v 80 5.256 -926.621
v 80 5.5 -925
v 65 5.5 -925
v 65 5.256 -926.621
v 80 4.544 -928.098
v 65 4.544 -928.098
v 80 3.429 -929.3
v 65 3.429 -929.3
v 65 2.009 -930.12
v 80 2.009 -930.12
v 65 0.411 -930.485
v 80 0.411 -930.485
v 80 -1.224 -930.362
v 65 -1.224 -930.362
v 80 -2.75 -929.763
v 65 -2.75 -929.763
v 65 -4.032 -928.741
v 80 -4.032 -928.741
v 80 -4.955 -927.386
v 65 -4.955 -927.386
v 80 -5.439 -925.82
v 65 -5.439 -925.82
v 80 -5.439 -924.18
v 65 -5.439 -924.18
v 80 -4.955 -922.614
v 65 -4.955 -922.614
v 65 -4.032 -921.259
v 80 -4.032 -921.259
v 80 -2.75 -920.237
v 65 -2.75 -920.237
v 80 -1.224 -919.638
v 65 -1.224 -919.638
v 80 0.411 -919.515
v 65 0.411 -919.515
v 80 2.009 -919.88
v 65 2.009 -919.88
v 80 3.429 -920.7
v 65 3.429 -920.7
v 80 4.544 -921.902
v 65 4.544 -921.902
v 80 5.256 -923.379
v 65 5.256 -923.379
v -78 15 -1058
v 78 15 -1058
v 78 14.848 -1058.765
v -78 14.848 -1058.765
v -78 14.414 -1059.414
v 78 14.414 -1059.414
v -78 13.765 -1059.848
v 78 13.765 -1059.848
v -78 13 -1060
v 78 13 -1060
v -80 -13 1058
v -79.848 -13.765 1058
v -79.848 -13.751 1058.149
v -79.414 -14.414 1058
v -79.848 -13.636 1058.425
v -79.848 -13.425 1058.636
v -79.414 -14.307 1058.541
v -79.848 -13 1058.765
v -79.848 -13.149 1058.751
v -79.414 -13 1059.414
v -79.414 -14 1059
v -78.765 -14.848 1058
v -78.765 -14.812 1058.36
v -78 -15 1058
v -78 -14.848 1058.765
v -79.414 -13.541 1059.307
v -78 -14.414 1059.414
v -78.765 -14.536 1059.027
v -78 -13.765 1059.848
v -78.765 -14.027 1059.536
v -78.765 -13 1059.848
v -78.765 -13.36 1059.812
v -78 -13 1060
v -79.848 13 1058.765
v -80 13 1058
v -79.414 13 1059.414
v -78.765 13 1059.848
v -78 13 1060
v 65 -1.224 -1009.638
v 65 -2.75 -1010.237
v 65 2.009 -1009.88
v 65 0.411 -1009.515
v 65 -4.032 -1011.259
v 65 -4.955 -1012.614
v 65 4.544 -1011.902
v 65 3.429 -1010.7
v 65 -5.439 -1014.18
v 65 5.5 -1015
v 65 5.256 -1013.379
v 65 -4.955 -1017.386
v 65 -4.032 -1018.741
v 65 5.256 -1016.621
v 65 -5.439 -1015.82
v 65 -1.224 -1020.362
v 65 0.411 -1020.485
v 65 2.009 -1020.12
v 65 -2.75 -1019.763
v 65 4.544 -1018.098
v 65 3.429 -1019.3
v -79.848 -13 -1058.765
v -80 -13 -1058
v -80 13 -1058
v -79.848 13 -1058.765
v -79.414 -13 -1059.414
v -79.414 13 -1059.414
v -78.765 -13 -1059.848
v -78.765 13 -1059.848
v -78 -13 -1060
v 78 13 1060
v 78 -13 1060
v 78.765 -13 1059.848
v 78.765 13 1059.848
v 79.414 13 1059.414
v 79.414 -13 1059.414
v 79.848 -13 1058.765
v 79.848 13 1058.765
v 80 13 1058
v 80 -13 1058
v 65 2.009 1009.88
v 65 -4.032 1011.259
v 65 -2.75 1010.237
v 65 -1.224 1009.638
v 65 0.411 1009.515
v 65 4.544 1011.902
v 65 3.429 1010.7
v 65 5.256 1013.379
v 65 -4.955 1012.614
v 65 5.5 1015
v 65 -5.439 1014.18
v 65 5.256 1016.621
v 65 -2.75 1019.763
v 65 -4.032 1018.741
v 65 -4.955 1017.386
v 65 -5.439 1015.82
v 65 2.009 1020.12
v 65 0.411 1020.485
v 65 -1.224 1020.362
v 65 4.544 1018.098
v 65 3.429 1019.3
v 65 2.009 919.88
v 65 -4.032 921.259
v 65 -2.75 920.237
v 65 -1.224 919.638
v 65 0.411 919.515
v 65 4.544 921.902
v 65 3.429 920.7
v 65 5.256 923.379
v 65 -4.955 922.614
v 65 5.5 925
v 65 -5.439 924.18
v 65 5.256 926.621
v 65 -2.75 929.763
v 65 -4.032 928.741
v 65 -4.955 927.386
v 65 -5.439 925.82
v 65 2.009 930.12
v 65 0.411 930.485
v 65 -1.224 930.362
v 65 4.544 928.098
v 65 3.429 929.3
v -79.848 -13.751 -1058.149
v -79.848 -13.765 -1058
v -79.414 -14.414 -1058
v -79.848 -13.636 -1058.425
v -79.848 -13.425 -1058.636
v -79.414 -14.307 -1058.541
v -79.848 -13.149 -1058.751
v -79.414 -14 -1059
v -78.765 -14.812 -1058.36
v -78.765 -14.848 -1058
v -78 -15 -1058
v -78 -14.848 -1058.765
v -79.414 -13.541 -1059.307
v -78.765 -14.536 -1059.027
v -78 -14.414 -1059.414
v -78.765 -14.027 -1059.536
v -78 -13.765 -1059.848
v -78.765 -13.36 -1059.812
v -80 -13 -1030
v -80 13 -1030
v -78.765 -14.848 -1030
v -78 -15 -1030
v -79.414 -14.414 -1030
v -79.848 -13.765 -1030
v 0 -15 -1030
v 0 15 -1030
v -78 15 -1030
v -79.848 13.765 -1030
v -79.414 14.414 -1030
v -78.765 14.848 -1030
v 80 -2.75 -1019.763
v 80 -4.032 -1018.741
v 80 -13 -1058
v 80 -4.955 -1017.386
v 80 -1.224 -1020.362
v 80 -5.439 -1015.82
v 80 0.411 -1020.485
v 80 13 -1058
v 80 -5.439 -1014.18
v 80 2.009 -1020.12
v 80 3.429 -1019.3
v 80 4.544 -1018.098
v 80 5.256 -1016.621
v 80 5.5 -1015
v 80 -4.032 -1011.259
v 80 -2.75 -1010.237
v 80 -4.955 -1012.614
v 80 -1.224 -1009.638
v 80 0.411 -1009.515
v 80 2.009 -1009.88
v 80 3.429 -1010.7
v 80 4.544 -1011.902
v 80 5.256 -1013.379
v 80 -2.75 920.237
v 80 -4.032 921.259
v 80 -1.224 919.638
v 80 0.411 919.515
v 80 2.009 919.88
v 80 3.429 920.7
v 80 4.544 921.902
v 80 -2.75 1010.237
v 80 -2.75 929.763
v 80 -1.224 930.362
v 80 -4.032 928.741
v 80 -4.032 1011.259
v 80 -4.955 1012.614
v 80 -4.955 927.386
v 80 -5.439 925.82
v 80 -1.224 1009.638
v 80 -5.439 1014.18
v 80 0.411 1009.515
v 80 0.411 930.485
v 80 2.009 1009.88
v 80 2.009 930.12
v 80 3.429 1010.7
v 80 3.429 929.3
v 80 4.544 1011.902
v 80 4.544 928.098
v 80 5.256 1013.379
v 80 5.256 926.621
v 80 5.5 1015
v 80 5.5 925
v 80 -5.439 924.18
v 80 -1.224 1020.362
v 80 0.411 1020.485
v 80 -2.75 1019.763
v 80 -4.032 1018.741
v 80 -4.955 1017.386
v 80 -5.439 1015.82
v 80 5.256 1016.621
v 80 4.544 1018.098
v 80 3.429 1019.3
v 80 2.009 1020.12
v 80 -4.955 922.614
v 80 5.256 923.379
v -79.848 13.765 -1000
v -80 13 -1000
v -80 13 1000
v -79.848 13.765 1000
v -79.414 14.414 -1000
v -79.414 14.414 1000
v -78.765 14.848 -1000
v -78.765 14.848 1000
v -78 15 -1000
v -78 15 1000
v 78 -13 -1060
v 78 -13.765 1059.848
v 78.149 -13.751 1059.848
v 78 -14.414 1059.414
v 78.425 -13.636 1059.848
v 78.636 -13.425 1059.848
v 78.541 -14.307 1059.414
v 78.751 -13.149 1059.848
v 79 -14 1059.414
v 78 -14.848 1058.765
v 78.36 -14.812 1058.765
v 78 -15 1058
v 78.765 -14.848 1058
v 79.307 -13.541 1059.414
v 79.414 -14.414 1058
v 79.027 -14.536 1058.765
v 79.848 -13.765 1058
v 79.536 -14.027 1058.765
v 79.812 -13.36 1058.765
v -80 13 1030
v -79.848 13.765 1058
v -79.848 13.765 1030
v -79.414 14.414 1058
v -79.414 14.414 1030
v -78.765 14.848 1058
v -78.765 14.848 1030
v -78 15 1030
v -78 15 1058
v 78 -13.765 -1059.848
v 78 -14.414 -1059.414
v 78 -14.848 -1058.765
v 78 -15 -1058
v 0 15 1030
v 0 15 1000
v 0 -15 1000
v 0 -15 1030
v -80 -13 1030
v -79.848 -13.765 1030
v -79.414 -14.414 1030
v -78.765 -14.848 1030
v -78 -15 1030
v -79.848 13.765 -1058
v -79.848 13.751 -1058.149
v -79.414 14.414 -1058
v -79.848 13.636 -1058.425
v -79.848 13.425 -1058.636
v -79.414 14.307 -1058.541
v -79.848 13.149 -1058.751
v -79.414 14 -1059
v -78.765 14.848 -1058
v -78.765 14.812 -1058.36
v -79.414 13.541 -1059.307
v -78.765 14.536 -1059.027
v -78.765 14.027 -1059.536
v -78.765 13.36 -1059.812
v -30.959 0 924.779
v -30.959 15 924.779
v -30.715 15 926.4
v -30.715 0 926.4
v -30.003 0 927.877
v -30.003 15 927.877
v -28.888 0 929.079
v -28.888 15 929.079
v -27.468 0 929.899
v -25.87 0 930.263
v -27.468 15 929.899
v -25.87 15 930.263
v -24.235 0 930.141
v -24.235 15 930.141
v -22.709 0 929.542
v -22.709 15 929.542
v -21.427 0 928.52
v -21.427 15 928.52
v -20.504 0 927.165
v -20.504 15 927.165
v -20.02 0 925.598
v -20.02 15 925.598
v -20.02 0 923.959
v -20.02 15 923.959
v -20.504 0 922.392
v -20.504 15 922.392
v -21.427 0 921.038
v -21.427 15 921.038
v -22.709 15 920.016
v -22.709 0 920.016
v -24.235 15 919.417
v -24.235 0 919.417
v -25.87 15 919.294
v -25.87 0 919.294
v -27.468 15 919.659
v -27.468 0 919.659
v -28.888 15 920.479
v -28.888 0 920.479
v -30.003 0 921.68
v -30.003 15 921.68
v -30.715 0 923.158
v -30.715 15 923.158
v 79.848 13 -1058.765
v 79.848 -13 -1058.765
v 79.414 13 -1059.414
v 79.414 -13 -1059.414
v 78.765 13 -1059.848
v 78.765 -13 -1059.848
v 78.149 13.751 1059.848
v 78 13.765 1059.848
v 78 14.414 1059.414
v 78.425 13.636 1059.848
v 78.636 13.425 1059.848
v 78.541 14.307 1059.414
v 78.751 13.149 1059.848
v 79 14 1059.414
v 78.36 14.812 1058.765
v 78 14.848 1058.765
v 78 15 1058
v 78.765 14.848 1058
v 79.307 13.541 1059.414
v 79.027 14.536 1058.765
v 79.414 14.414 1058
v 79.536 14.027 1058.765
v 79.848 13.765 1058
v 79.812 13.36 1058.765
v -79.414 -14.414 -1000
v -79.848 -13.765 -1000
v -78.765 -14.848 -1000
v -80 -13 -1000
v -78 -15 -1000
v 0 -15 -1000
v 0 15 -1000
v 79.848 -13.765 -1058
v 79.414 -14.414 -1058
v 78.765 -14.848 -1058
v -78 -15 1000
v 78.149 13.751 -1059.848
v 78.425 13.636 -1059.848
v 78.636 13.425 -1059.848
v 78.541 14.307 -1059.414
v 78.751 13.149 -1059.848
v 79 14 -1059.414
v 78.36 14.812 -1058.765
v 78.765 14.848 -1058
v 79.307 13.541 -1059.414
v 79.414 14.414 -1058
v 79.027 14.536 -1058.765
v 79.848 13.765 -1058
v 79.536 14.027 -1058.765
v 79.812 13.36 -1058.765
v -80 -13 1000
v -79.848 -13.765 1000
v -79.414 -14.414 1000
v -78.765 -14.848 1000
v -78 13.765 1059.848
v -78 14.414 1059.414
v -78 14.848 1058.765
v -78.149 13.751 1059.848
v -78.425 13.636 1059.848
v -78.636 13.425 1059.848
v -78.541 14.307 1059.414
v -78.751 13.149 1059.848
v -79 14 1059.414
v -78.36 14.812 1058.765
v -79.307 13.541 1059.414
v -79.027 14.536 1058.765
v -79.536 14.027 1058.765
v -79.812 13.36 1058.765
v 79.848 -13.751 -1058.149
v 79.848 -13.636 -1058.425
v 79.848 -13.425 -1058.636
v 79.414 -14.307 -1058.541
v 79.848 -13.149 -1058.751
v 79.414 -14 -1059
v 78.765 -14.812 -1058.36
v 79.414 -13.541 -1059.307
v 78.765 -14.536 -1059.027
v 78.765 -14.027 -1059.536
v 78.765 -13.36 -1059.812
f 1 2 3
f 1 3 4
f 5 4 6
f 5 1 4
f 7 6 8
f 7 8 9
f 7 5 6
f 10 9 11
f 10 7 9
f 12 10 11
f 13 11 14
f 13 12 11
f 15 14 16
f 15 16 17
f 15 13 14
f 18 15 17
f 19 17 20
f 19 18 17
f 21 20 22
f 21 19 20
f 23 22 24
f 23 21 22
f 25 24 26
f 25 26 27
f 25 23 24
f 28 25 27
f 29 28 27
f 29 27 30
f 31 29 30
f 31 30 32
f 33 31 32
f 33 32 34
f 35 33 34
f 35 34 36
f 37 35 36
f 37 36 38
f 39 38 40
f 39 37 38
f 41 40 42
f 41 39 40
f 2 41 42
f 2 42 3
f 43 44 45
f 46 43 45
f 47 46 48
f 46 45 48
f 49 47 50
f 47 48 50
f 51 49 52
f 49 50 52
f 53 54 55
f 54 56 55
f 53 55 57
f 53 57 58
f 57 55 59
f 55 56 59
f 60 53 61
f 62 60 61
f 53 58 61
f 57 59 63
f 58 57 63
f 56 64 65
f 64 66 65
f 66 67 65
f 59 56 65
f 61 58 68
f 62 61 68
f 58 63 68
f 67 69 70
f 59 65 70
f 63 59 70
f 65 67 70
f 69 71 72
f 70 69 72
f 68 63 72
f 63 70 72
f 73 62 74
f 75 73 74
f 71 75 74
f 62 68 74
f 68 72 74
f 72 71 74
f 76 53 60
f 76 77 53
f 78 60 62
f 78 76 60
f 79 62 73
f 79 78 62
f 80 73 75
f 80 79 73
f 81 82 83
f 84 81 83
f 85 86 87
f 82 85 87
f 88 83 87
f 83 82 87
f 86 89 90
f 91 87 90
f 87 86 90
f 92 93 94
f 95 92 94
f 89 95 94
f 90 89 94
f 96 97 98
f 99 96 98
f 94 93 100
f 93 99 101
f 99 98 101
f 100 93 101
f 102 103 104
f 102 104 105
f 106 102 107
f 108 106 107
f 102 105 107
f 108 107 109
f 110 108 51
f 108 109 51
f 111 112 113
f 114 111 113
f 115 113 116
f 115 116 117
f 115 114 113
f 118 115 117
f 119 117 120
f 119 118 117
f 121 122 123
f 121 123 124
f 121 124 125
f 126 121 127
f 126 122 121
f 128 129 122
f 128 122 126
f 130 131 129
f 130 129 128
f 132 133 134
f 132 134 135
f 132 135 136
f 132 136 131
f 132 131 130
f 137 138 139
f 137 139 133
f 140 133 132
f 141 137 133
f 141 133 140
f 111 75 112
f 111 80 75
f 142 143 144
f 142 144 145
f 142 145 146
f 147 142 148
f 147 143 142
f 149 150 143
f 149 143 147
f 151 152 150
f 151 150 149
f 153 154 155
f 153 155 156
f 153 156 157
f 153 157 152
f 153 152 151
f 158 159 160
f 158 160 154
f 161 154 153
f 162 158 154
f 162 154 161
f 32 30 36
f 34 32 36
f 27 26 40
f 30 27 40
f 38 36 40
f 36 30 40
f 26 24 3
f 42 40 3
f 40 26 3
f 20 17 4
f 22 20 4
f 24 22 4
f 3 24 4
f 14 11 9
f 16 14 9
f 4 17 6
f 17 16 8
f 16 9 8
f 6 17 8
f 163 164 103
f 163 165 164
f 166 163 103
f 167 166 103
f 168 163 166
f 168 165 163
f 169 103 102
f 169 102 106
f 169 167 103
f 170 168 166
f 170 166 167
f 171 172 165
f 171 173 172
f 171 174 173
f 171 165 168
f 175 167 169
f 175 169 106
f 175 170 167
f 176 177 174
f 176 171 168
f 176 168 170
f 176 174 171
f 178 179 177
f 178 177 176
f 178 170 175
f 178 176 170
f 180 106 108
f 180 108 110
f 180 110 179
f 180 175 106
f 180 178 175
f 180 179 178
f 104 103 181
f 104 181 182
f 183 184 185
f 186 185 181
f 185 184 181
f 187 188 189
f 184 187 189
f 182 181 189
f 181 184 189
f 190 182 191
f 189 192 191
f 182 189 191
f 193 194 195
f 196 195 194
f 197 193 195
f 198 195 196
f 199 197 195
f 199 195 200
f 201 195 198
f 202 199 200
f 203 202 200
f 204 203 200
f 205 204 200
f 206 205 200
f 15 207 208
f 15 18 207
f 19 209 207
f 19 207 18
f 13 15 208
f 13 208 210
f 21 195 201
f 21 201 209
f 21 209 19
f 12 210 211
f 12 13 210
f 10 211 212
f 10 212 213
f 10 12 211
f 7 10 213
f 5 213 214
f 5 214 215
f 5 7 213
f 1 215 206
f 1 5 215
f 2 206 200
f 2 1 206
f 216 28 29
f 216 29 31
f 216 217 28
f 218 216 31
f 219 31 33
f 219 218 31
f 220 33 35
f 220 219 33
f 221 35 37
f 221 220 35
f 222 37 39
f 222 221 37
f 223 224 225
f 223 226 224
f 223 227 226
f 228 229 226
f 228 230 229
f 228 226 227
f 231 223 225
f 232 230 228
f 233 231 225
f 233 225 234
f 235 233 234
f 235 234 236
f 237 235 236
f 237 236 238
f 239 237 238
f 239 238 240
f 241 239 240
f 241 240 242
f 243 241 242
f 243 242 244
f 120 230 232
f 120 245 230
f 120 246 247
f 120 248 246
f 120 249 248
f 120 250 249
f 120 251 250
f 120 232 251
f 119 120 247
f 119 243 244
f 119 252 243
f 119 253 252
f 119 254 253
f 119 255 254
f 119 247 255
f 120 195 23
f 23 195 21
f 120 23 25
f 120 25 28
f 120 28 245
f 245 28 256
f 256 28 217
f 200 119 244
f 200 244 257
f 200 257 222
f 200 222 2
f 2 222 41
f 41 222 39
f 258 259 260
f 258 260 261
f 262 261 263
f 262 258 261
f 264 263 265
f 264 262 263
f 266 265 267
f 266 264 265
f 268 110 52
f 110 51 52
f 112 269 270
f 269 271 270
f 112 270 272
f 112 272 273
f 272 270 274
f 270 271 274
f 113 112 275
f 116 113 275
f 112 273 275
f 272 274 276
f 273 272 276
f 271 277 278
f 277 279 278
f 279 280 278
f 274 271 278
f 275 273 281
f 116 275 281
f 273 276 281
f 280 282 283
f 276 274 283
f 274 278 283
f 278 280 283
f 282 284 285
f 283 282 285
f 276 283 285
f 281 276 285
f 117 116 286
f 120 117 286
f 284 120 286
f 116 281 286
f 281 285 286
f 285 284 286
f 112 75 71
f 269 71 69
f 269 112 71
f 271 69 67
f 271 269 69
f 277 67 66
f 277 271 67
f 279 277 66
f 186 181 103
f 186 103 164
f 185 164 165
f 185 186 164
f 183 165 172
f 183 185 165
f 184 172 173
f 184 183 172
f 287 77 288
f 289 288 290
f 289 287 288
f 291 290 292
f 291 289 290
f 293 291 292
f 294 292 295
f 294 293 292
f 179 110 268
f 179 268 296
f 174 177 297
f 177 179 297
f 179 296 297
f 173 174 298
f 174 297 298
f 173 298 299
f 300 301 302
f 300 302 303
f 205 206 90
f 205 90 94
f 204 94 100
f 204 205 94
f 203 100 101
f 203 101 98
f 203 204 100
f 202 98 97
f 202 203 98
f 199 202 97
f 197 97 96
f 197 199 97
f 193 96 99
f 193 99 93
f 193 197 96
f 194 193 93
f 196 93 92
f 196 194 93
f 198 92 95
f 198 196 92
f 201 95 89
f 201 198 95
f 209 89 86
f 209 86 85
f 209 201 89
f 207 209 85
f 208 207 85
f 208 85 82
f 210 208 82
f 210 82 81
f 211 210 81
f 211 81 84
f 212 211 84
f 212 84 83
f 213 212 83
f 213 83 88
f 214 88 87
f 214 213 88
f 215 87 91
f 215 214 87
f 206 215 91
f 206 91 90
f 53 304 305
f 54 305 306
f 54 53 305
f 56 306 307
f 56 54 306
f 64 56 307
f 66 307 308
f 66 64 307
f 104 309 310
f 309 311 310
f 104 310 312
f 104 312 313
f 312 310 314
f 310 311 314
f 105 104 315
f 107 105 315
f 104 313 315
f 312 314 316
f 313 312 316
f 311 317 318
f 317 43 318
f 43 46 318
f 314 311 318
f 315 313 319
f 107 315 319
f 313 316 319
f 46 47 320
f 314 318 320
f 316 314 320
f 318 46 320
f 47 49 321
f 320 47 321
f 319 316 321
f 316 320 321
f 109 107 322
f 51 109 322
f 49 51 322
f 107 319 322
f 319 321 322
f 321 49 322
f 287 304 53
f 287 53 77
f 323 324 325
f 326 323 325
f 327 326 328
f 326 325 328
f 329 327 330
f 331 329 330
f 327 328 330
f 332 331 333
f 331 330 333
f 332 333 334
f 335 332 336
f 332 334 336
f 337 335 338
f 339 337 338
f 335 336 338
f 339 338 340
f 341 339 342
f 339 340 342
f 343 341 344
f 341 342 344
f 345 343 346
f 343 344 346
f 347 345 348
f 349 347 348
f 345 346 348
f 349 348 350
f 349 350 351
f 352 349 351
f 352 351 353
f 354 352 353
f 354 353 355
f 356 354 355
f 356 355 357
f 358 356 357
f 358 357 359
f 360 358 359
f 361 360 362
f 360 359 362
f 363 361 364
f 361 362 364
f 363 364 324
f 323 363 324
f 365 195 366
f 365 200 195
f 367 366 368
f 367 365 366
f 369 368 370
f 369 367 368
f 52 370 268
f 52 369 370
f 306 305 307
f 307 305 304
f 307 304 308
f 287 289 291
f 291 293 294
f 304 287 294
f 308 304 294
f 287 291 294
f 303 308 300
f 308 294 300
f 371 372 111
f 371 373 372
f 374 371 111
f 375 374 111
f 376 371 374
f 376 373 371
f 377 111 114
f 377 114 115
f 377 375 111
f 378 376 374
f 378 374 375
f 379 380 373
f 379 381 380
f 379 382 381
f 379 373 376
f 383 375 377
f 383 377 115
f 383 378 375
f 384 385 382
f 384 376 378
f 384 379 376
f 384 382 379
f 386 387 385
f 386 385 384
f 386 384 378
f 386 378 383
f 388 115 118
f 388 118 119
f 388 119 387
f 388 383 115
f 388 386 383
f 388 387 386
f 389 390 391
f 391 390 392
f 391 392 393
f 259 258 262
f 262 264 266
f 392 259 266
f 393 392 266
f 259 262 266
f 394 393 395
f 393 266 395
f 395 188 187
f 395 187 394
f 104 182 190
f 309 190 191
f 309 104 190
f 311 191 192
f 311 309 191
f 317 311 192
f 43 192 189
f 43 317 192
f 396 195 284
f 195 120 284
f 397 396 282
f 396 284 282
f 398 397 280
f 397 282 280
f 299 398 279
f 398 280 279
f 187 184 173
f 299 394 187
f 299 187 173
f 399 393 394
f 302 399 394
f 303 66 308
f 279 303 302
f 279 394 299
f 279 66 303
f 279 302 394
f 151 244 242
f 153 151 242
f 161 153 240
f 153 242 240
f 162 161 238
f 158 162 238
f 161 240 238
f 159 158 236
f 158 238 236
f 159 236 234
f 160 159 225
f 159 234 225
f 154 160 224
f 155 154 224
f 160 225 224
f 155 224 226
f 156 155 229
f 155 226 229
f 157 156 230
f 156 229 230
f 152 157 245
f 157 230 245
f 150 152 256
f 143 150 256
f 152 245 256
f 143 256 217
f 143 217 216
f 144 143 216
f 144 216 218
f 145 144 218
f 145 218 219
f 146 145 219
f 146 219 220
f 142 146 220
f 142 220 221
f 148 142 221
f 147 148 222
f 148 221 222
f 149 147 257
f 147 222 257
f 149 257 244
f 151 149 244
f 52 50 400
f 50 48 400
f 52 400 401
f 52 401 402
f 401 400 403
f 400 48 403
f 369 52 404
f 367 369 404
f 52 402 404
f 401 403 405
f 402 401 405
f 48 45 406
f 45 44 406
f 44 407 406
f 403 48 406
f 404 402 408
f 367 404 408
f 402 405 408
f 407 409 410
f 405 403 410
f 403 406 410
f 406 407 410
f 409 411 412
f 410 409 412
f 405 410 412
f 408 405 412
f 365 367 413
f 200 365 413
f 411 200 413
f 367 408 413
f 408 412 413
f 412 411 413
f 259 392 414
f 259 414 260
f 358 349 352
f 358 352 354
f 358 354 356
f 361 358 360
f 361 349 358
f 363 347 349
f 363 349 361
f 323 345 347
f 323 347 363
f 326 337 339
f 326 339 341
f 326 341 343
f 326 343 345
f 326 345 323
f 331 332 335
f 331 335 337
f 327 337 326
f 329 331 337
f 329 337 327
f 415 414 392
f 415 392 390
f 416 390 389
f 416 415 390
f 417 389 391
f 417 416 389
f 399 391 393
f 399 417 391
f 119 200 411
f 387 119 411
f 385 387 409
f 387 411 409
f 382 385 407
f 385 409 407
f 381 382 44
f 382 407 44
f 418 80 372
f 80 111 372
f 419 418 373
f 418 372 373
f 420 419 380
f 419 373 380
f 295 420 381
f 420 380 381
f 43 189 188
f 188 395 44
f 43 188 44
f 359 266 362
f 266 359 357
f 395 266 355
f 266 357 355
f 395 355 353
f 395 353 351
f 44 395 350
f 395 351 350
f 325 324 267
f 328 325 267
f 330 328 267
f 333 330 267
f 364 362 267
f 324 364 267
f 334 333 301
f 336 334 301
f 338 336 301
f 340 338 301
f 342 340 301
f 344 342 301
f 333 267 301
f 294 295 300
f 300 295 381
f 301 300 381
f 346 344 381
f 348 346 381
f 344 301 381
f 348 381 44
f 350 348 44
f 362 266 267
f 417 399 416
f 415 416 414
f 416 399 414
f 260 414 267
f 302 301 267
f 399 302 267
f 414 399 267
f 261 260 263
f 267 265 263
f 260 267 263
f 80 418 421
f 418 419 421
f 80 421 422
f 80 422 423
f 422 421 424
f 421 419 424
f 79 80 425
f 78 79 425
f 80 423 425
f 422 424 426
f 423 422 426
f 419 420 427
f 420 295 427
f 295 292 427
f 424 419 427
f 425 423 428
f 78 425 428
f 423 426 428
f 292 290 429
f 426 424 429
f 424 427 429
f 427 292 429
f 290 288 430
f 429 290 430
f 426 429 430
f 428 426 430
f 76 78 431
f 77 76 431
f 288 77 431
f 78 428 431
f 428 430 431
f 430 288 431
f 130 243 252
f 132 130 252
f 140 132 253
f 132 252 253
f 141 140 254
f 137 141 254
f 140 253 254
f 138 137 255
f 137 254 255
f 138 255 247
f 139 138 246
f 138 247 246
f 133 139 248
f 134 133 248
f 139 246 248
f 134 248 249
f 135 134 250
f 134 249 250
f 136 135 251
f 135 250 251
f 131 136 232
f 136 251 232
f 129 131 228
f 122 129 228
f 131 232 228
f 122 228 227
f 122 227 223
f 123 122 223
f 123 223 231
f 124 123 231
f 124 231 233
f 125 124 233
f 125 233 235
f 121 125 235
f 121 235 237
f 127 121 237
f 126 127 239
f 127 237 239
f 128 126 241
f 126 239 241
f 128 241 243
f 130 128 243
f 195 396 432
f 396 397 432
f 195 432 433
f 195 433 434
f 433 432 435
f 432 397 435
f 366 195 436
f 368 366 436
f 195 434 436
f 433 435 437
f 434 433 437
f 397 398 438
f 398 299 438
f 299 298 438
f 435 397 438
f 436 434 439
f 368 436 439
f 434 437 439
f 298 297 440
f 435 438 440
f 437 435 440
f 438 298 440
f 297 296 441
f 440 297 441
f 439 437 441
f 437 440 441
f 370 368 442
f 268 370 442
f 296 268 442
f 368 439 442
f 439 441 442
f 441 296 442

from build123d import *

# Parameters (mm, degrees)
F0_W     = 160
F0_H     = 30
F1_DEPTH = 1060
F2_R     = 2
F3_W     = 2
F3_H     = 30
F3_W_2   = 78
F4_DEPTH = 30.001
F3_W_3   = 80
F3_R     = 5.5
F5_DEPTH = 15
F6_R     = 5.5
F7_DEPTH = 15


# Not quite as in the source:
# - a pattern or mirror of a feature is missing from the dataset's text; its kind, count and spacing are read off the source's solid


with BuildPart() as f1:
    # F0 (on Top) → F1 (new body, symmetric)
    with BuildSketch(Plane.XY):
        Rectangle(F0_W, F0_H)
    extrude(amount=F1_DEPTH, both=True)

    # F2
    f2_edges = [f1.edges().sort_by_distance(p)[0] for p in [
        (0, -15, -1060),
        (80, -15, 0),
        (0, -15, 1060),
        (-80, -15, 0),
        (80, 15, 0),
        (0, 15, -1060),
        (-80, 15, 0),
        (0, 15, 1060),
        (80, 0, 1060),
        (-80, 0, 1060),
        (80, 0, -1060),
        (-80, 0, -1060),
    ]]
    fillet(f2_edges, radius=F2_R)

    # F3 (on face) → F4 (cut, through all)
    with BuildSketch(Plane(origin=(0, 15, 0), x_dir=(-1, 0, 0), z_dir=(0, 1, 0))):
        with Locations((79, 1015)):
            Rectangle(F3_W, F3_H)
        with Locations((39, 1015)):
            Rectangle(F3_W_2, F3_H)
        with Locations((79, -1015)):
            Rectangle(F3_W, F3_H)
        with Locations((39, -1015)):
            Rectangle(F3_W_2, F3_H)
    extrude(amount=-F4_DEPTH, mode=Mode.SUBTRACT)

    # F3 (on face) → F5 (cut)
    with BuildSketch(Plane(origin=(0, 15, 0), x_dir=(-1, 0, 0), z_dir=(0, 1, 0))):
        with Locations((40, 1015)):
            Rectangle(F3_W_3, F3_H)
        with Locations((40, -1015)):
            Rectangle(F3_W_3, F3_H)
        with Locations((25.4589803517, 924.7787594795)):
            Circle(F3_R)
    extrude(amount=-F5_DEPTH, mode=Mode.SUBTRACT)

    # F6 (on face) → F7 (cut)
    with BuildSketch(Plane.YZ.offset(80)):
        with Locations((0, 1015)):
            Circle(F6_R)
        with Locations((0, 925)):
            Circle(F6_R)
    f7 = extrude(amount=-F7_DEPTH, mode=Mode.SUBTRACT)

    # F7_copies: F7 across plane
    add(f7.mirror(Plane(origin=(0, 0, 0), x_dir=(-1, 0, 0), z_dir=(0, 0, -1))), mode=Mode.SUBTRACT)


solid = f1.part
